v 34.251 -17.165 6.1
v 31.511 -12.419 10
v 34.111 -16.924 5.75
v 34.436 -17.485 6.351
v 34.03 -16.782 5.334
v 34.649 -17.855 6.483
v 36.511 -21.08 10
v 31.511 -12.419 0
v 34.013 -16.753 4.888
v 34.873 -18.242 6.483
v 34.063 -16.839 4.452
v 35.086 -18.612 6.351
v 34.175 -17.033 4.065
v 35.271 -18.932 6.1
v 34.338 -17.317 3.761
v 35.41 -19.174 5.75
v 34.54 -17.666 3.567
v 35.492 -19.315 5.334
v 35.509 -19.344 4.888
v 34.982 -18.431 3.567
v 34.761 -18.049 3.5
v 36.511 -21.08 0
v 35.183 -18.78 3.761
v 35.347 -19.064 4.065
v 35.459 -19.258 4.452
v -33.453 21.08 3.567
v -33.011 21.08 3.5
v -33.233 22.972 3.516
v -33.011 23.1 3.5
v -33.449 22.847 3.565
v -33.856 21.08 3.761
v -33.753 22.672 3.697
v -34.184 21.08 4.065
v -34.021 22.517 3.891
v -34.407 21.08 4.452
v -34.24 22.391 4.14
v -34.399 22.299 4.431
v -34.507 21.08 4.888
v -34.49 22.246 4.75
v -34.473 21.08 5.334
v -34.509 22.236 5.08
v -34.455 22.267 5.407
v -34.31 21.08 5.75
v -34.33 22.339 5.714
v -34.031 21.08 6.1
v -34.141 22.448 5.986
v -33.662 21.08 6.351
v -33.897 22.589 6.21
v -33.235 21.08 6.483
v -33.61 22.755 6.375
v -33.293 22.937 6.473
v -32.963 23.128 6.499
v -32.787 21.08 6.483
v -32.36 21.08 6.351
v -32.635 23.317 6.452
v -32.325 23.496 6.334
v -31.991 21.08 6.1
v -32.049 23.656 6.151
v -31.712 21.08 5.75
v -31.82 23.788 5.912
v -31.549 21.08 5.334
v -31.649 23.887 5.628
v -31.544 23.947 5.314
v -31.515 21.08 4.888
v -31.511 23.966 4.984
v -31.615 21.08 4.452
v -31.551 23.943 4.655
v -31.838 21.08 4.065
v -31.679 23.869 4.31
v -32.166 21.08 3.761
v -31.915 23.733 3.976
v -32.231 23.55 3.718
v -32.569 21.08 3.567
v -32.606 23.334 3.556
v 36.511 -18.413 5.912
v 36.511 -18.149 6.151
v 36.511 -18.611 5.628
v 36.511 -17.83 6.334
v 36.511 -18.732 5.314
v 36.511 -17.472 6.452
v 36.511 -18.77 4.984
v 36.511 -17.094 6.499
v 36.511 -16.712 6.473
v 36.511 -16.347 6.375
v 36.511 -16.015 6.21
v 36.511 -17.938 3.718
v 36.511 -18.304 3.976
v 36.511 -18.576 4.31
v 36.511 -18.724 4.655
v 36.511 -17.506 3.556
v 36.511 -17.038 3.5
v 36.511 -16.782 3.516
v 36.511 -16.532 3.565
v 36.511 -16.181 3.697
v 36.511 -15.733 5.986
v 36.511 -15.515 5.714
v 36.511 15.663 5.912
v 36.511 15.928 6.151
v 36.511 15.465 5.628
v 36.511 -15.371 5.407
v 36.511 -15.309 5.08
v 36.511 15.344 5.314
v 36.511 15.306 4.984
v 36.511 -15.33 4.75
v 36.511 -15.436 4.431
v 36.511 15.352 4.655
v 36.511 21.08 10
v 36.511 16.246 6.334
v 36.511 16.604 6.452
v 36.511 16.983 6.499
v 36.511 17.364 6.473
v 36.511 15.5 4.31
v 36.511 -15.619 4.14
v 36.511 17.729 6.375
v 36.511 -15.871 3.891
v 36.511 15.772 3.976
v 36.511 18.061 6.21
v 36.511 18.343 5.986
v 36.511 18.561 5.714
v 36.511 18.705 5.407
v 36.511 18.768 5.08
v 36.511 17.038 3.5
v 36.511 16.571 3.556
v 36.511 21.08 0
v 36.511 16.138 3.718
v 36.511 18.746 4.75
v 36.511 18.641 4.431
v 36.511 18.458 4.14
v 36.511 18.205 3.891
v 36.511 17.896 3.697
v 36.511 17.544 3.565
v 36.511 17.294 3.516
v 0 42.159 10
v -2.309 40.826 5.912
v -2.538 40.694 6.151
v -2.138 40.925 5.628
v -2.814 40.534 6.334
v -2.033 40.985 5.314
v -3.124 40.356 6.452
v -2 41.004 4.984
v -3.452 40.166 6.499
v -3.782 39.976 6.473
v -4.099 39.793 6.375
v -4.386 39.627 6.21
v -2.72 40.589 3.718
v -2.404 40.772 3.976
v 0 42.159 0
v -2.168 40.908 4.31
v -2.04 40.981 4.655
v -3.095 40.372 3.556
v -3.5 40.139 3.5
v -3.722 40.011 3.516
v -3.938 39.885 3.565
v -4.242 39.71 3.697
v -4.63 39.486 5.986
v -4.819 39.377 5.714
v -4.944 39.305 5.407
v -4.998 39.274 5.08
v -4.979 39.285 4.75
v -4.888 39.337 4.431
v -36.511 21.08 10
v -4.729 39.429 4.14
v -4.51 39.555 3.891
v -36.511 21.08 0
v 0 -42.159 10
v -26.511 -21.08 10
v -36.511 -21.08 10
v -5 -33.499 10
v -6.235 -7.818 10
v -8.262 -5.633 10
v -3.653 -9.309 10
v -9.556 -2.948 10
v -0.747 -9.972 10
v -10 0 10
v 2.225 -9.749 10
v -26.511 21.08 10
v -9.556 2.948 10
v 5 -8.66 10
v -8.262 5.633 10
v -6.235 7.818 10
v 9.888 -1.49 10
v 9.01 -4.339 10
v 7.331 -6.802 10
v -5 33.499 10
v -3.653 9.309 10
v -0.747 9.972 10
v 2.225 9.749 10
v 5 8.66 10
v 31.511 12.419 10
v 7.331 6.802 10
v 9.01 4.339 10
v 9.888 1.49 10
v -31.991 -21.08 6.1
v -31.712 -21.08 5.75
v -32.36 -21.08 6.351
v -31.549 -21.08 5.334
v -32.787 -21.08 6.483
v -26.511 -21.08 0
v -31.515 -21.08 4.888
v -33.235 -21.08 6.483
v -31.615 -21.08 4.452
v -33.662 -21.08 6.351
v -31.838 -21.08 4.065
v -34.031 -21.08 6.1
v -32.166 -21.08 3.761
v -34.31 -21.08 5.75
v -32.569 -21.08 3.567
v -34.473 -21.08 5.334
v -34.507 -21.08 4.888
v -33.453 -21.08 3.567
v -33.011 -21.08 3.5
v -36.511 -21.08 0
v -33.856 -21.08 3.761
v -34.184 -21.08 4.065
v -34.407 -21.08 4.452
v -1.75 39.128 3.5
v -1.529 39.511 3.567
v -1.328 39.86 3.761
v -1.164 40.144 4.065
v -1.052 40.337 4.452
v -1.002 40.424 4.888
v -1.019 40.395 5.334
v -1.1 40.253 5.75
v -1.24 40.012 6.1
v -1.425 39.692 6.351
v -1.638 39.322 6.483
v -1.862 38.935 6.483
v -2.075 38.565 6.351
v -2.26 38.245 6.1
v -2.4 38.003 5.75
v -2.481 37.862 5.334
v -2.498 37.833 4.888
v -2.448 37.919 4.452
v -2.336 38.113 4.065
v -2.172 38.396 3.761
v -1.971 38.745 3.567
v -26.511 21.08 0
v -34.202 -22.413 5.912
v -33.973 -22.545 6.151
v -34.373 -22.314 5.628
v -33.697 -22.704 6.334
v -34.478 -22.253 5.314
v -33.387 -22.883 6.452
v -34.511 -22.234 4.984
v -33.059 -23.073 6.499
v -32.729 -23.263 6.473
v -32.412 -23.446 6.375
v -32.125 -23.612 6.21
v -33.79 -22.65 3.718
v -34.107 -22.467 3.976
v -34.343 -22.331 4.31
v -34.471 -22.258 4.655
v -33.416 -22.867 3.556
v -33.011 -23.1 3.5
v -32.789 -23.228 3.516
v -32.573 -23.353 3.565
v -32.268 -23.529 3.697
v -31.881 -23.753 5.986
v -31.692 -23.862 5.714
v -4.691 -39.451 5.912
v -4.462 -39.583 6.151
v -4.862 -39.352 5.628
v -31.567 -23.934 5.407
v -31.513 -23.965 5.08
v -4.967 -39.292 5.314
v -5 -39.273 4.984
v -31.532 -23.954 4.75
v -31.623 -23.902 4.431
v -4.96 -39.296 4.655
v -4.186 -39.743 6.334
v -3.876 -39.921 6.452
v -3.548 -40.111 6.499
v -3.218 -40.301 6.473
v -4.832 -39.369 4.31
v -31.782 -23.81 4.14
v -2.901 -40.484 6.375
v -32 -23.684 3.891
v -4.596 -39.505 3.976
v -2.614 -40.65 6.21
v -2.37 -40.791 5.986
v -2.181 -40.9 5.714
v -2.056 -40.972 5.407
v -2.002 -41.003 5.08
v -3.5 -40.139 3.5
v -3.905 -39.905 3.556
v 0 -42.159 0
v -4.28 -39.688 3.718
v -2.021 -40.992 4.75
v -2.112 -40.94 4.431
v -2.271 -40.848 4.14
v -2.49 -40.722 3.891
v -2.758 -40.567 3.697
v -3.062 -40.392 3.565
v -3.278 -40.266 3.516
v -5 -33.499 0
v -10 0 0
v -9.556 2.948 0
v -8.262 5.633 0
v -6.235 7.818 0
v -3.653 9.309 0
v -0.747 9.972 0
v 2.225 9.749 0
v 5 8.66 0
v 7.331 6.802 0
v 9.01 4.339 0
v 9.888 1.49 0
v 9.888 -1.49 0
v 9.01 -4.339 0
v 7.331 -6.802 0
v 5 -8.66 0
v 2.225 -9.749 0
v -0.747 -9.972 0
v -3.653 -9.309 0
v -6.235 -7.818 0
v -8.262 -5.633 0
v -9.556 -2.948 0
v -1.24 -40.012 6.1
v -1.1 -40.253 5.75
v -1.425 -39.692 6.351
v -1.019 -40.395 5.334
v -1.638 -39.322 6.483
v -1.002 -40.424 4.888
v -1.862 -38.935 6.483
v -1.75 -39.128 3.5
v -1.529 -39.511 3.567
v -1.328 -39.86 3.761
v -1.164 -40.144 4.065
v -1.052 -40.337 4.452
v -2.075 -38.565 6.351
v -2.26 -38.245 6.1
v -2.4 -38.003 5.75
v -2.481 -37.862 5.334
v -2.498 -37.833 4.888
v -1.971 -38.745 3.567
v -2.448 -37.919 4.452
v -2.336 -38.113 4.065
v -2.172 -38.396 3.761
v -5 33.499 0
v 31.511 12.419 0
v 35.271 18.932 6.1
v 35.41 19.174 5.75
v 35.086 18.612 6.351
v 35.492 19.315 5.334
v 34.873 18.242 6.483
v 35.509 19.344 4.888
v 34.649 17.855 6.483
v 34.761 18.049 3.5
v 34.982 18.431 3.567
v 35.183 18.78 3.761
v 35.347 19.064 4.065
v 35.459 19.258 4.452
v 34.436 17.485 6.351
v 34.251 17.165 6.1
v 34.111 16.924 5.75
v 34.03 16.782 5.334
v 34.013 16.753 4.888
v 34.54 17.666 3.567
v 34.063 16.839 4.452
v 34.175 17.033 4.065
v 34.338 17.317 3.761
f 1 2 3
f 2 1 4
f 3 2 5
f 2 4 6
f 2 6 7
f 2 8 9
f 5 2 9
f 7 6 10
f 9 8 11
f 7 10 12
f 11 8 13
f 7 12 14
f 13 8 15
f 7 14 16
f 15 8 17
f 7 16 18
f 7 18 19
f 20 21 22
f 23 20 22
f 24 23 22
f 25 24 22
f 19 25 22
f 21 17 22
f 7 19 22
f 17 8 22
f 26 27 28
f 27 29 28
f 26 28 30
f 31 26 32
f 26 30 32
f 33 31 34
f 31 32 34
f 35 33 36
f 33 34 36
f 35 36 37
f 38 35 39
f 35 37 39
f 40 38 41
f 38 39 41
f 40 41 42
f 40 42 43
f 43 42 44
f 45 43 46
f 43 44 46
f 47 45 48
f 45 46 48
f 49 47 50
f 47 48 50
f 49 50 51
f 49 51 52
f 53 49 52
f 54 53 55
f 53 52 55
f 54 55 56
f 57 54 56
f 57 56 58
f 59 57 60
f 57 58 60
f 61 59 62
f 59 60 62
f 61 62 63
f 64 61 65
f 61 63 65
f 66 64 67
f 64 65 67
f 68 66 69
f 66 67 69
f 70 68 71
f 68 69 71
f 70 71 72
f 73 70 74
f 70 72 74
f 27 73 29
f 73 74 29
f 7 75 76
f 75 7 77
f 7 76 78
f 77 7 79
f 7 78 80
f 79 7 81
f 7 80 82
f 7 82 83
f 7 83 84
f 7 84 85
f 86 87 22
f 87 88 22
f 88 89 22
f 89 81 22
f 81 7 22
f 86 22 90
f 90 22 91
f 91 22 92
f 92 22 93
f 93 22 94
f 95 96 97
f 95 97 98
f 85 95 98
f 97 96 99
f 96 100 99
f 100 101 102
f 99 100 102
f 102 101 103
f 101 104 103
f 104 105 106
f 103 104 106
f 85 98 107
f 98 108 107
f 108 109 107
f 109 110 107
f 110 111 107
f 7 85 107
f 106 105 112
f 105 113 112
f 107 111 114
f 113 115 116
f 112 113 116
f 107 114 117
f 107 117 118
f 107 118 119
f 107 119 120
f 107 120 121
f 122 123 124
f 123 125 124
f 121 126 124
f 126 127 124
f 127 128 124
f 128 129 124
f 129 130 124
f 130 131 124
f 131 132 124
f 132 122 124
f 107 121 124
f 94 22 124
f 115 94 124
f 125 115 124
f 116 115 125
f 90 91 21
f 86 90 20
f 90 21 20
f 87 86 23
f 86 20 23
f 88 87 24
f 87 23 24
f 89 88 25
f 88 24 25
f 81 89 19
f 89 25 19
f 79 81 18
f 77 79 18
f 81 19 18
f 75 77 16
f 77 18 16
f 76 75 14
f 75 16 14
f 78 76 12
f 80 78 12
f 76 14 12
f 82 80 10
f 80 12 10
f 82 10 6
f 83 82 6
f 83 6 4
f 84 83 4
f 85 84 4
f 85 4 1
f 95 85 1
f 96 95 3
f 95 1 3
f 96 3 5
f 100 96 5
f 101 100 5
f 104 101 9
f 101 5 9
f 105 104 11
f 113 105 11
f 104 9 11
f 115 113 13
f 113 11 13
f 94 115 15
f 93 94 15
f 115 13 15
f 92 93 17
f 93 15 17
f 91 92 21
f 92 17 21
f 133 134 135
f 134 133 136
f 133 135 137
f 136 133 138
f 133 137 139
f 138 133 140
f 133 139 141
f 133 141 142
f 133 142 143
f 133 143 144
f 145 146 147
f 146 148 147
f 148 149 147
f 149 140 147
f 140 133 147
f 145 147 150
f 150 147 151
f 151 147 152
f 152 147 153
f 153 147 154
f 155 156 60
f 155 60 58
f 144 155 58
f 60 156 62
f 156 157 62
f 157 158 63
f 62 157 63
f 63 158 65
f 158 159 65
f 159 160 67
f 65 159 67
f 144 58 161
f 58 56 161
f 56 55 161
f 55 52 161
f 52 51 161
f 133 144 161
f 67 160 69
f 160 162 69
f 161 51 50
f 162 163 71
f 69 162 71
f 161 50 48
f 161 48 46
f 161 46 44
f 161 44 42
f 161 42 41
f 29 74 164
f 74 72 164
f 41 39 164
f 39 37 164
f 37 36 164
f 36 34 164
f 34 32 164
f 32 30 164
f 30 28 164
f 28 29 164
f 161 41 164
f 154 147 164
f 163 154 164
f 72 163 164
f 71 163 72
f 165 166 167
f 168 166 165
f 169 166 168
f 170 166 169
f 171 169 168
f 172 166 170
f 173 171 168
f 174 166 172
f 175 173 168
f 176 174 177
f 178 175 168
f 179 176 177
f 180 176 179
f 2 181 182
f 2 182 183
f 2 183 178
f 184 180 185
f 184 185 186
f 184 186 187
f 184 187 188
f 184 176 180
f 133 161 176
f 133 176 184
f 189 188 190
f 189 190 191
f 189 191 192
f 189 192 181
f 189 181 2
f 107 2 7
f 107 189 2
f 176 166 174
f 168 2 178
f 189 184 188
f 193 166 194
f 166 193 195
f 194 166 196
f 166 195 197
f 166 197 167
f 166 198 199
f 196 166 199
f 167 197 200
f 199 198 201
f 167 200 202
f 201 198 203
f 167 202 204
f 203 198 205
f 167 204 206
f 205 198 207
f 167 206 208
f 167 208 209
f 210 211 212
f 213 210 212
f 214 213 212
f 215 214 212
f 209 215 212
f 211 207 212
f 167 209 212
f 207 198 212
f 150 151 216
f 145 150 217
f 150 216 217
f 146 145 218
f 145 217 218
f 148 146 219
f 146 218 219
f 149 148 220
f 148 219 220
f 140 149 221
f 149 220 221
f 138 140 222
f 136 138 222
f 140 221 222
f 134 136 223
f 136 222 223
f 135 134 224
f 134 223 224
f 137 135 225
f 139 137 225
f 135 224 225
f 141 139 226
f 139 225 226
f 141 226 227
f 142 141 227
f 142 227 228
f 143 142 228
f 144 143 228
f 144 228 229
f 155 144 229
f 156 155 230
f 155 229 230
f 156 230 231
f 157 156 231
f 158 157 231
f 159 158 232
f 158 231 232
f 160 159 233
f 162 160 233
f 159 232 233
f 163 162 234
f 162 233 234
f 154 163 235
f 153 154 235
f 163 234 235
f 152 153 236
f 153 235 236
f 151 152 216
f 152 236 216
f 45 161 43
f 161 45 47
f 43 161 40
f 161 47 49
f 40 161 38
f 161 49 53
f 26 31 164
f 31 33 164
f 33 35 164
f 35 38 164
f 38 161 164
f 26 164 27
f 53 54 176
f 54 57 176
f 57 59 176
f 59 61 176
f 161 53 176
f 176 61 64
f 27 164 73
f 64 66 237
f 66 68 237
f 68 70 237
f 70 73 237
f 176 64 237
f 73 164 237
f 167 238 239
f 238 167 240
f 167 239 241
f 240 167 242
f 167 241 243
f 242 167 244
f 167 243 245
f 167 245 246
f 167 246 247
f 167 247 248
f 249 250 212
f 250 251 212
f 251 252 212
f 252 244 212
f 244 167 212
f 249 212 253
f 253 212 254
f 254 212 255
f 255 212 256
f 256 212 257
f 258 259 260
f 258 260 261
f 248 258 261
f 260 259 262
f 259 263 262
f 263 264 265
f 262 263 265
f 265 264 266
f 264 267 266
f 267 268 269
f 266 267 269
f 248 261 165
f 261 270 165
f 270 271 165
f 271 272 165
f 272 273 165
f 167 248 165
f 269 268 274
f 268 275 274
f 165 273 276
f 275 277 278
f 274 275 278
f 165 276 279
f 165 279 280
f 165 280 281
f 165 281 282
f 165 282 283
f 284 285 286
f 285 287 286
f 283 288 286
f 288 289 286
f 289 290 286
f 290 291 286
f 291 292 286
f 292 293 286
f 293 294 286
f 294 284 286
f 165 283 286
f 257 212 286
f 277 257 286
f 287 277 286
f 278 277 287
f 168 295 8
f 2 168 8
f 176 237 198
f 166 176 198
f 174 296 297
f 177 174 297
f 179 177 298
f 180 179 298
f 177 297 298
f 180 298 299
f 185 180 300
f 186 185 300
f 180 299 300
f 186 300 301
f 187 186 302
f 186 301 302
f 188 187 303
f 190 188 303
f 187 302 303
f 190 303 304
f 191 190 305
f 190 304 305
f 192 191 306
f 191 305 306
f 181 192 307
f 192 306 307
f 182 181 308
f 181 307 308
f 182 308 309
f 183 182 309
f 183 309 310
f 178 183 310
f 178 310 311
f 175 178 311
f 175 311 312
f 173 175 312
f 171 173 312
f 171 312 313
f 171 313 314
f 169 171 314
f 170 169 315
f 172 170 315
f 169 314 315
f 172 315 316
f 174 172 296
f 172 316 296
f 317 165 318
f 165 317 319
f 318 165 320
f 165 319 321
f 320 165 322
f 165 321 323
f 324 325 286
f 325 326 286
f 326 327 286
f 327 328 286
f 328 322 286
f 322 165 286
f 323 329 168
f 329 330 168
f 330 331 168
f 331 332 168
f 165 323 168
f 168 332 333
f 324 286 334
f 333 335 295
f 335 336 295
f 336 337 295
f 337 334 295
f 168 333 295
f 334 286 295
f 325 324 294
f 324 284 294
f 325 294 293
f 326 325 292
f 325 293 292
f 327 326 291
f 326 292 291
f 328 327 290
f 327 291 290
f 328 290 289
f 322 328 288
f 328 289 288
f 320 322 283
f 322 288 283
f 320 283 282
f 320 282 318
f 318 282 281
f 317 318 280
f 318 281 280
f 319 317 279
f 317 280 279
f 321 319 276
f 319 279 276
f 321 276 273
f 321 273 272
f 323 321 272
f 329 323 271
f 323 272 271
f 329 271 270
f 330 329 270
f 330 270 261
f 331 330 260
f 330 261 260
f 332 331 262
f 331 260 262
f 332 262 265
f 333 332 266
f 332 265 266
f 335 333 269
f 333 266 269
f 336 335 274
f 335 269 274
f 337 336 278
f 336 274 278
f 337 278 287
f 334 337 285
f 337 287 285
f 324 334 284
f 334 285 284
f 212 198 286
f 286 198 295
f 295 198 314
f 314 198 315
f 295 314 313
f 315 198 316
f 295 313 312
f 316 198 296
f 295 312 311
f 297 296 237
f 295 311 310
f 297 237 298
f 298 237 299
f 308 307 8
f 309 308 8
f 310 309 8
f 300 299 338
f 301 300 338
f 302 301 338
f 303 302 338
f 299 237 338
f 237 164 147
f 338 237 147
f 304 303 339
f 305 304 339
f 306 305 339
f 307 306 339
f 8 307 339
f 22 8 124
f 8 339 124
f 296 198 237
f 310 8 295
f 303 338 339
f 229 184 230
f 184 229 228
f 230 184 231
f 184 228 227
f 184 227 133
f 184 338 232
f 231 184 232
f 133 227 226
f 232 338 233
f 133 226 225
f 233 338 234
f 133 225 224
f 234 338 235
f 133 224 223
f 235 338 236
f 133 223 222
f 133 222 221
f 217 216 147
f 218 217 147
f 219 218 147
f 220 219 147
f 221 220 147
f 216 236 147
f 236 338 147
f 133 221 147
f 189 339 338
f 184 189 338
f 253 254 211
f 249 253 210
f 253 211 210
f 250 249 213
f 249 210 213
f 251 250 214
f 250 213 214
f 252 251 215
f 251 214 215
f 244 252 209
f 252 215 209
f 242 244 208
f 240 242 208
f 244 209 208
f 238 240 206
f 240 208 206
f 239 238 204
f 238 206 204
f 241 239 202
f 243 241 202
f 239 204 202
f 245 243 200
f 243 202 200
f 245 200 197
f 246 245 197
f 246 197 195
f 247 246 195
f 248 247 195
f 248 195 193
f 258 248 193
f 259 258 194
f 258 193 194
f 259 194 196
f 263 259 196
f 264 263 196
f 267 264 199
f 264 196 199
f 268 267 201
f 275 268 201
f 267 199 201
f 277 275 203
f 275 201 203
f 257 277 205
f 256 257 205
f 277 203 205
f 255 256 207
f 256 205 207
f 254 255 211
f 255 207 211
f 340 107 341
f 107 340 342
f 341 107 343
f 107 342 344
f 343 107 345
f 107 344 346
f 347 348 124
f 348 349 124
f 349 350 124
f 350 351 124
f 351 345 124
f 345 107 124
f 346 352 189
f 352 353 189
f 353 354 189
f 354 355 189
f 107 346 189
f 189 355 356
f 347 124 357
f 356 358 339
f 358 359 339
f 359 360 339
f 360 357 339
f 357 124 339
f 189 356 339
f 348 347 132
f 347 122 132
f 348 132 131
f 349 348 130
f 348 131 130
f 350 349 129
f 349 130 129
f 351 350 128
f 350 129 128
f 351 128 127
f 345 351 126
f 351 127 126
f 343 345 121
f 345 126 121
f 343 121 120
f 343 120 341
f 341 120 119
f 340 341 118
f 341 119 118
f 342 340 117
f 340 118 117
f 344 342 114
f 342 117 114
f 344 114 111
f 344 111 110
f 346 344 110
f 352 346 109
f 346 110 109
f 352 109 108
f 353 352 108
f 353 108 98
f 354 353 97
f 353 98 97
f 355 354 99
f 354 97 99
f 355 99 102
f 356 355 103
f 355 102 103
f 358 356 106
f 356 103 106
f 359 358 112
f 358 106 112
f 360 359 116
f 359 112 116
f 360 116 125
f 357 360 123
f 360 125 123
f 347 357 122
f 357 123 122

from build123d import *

# Parameters (mm, degrees)
BOSS_EXTRUDE1_DEPTH = 10
SKETCH3_R           = 1.5
CUT_EXTRUDE1_DEPTH  = 74.703487344
SKETCH5_R           = 10
CUT_EXTRUDE2_DEPTH  = 10
CIRPATTERN1_COUNT   = 3


with BuildPart() as part:
    # Sketch1 → Boss-Extrude1 (new body)
    with BuildSketch(Plane.XY):
        Polygon((-36.510971114, 21.079619001), (-26.510971114, 21.079619001), (-26.510971114, -21.079619001), (-36.510971114, -21.079619001), (0, -42.159238002), (-5, -33.498983964), (31.510971114, -12.419364963), (36.510971114, -21.079619001), (36.510971114, 21.079619001), (31.510971114, 12.419364963), (-5, 33.498983964), (0, 42.159238002), align=None)
    extrude(amount=BOSS_EXTRUDE1_DEPTH)

    # Sketch3 → Cut-Extrude1 (cut, symmetric)
    with BuildSketch(Plane(origin=(0, -21.079619001, 0), x_dir=(1, 0, 0), z_dir=(0, 1, 0))):
        with Locations(Location((-33.010971114, -5, 0), (0, 0, 90))):
            Circle(SKETCH3_R)
    cut_extrude1 = extrude(amount=CUT_EXTRUDE1_DEPTH, both=True, mode=Mode.SUBTRACT)

    # Sketch5 → Cut-Extrude2 (cut)
    with BuildSketch(Plane(origin=(0, 0, 0), x_dir=(-1, 0, 0), z_dir=(0, 0, -1))):
        Circle(SKETCH5_R)
    extrude(amount=-CUT_EXTRUDE2_DEPTH, mode=Mode.SUBTRACT)

    # CirPattern1: Cut-Extrude1 ×3 about axis
    cirpattern1_axis = Axis((0, 0, 10), (0, 0, -1))
    for i in range(1, CIRPATTERN1_COUNT):
        add(cut_extrude1.rotate(cirpattern1_axis, i * 360 / CIRPATTERN1_COUNT), mode=Mode.SUBTRACT)


solid = part.part
